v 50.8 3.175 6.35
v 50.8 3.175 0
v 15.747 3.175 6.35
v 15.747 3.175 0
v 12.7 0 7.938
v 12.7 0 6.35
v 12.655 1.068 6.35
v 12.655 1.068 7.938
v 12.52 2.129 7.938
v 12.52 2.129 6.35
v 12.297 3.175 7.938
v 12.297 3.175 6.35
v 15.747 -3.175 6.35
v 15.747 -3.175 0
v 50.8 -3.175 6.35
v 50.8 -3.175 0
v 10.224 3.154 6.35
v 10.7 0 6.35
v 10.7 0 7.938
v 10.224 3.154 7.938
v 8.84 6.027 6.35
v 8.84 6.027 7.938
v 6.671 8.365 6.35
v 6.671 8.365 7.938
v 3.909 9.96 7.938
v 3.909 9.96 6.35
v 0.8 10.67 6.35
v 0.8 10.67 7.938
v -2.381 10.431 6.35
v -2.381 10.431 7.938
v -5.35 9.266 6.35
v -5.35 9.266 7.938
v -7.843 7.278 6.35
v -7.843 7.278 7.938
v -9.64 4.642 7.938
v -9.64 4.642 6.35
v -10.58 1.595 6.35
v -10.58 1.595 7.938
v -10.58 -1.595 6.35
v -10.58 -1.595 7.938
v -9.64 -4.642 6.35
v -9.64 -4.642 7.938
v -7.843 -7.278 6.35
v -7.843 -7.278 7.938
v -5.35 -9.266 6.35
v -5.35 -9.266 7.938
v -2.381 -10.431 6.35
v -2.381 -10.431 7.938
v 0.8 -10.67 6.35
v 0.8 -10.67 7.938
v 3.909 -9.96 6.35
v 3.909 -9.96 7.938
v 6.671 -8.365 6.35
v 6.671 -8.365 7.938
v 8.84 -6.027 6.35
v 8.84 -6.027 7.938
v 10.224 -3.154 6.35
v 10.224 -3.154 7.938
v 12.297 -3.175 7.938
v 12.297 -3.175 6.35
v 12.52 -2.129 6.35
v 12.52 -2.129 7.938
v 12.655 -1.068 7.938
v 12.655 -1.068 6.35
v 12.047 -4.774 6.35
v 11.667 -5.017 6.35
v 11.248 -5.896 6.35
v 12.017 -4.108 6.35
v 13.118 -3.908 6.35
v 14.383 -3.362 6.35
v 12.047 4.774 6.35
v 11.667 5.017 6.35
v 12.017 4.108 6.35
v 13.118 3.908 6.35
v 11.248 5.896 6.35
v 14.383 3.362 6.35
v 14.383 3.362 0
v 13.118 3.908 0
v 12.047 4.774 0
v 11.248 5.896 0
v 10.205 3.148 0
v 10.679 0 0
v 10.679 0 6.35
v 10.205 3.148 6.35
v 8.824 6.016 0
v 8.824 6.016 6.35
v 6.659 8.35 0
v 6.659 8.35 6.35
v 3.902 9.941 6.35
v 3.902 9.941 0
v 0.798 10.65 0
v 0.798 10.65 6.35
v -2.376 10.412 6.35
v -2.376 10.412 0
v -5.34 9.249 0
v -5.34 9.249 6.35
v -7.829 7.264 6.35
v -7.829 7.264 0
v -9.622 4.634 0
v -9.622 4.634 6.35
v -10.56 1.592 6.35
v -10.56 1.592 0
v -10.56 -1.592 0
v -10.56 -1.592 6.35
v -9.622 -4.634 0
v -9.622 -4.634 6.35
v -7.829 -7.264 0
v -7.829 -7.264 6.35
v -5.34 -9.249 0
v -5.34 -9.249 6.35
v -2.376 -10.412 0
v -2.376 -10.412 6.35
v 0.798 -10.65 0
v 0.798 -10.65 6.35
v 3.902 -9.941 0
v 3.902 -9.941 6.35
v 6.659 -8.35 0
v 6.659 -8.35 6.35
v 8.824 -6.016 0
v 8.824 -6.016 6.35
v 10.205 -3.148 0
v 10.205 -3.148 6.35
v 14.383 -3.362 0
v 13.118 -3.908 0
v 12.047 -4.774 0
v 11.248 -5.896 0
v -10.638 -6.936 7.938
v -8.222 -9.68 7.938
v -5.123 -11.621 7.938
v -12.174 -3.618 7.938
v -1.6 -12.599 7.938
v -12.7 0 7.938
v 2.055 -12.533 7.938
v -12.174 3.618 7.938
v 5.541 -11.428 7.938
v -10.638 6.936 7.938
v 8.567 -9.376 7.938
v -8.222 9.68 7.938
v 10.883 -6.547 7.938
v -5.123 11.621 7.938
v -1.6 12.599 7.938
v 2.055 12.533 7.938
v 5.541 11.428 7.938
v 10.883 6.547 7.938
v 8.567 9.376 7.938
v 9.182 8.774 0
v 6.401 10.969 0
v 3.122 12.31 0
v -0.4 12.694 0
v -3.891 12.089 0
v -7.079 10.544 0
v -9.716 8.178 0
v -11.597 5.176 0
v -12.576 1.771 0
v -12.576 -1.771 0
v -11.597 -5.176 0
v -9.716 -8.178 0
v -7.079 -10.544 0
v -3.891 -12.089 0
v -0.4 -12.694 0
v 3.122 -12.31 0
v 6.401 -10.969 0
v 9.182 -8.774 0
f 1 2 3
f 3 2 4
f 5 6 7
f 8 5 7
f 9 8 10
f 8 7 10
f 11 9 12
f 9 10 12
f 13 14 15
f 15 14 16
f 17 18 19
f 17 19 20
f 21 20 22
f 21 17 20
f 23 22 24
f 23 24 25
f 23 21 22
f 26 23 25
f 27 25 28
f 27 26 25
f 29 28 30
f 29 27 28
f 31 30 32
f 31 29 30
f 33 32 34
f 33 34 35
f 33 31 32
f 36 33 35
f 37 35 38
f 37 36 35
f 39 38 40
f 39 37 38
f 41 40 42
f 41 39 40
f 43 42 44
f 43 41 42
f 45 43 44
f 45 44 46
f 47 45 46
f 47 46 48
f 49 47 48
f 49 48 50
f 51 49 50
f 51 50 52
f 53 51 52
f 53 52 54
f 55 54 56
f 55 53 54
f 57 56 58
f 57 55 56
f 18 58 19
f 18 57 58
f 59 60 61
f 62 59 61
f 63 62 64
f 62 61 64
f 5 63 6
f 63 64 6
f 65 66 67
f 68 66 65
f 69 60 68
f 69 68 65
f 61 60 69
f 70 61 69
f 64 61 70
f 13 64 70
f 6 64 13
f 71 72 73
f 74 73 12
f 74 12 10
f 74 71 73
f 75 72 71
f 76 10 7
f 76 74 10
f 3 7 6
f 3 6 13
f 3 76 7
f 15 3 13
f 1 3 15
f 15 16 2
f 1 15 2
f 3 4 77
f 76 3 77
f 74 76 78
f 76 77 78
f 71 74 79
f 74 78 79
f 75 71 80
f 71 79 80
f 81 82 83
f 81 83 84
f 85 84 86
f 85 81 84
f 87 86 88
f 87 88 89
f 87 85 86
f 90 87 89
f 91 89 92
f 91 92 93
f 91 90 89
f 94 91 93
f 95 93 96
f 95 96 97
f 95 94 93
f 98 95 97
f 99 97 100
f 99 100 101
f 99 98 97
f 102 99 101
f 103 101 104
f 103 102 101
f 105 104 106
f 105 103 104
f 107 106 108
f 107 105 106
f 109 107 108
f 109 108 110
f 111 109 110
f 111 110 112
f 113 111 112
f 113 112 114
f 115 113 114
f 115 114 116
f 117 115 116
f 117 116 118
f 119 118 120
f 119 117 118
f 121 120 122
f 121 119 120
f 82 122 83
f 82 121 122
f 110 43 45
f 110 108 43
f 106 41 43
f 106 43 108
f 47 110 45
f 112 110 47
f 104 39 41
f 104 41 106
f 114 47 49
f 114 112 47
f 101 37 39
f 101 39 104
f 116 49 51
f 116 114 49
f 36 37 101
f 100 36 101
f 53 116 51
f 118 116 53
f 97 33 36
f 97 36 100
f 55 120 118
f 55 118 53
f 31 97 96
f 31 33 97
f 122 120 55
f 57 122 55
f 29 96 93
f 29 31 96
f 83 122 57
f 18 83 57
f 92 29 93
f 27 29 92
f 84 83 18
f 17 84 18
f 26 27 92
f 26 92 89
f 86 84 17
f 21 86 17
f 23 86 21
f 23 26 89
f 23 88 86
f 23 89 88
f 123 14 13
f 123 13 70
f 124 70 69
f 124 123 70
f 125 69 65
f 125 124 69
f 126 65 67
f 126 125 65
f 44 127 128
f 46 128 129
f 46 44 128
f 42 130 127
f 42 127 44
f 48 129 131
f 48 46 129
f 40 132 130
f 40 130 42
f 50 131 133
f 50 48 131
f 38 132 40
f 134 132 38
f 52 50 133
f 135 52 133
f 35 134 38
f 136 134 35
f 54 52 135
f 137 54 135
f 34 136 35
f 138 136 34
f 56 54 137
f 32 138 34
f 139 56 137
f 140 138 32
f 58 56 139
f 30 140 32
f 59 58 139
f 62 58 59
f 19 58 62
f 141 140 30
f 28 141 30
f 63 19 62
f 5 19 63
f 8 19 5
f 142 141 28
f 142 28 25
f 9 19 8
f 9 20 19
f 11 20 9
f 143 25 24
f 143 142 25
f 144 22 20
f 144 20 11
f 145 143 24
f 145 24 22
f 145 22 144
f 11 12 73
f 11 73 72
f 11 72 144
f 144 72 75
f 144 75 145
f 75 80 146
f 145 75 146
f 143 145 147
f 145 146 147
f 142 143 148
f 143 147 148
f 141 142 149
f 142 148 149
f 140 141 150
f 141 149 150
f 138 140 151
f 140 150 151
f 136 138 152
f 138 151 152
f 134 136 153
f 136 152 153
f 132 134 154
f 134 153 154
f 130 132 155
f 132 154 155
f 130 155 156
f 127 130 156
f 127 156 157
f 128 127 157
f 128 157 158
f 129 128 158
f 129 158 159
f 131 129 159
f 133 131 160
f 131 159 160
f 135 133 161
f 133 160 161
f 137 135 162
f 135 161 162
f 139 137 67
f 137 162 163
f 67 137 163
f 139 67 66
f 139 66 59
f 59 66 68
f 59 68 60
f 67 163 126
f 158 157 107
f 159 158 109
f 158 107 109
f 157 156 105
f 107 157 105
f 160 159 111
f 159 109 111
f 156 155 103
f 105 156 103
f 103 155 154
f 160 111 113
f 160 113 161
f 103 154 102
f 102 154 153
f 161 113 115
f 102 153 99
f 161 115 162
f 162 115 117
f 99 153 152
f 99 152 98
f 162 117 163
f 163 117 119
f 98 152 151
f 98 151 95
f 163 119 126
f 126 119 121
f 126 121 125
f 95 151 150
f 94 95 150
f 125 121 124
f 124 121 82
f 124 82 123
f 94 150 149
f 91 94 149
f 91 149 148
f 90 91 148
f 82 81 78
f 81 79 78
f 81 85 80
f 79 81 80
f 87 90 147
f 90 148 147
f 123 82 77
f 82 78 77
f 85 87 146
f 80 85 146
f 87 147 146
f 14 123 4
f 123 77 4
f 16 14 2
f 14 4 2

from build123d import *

# Parameters (mm, degrees)
F0_R        = 10.6794819522
F1_DEPTH    = 6.35
F2_R        = 10.6995432546
F3_DEPTH    = 1.5875
F4_T1_DEPTH = 6.35
F5_T1_DEPTH = 6.35


# Not quite as in the source:
# - a fillet or chamfer that OpenCascade refuses, or shapes differently, is made with other operations: its cross-section is extruded or revolved along the edge and cut away or added


with BuildPart() as f1:
    # F0 (on Top) → F1 (new body)
    with BuildSketch(Plane.XY):
        with BuildLine():
            Line((50.8, 3.175), (12.2967221242, 3.175))
            ThreePointArc((12.2967221242, 3.175), (-12.7, 0), (12.2967221242, -3.175))
            Line((12.2967221242, -3.175), (50.8, -3.175))
            Line((50.8, -3.175), (50.8, 3.175))
        make_face()
        Circle(F0_R, mode=Mode.SUBTRACT)
    extrude(amount=F1_DEPTH)

    # F2 (on face) → F3 (join)
    with BuildSketch(Plane.XY.offset(6.35)):
        with BuildLine():
            ThreePointArc((12.2967221242, -3.175), (12.5987771426, -1.6002545145), (12.7, 0))
            ThreePointArc((12.7, 0), (12.5987771426, 1.6002545145), (12.2967221242, 3.175))
            ThreePointArc((12.2967221242, 3.175), (-12.7, 0), (12.2967221242, -3.175))
        make_face()
        Circle(F2_R, mode=Mode.SUBTRACT)
    extrude(amount=F3_DEPTH)

    # F4: fillet of radius 5.08 on 1 edges, made by hand

    # F4_s2 → F4_t1 (join)
    with BuildSketch(Plane.XY):
        with BuildLine():
            ThreePointArc((15.7474878949, -3.175), (13.1183381138, -3.908280383), (11.2482056392, -5.8964285714))
            ThreePointArc((11.2482056392, -5.8964285714), (11.8508417091, -4.5659118242), (12.2967221242, -3.175))
            Line((12.2967221242, -3.175), (15.7474878949, -3.175))
        make_face()
    extrude(amount=F4_T1_DEPTH)

    # F5: fillet of radius 5.08 on 1 edges, made by hand

    # F5_s2 → F5_t1 (join)
    with BuildSketch(Plane.XY):
        with BuildLine():
            ThreePointArc((15.7474878949, 3.175), (13.1183381138, 3.908280383), (11.2482056392, 5.8964285714))
            ThreePointArc((11.2482056392, 5.8964285714), (11.8508417091, 4.5659118242), (12.2967221242, 3.175))
            Line((12.2967221242, 3.175), (15.7474878949, 3.175))
        make_face()
    extrude(amount=F5_T1_DEPTH)


solid = f1.part
